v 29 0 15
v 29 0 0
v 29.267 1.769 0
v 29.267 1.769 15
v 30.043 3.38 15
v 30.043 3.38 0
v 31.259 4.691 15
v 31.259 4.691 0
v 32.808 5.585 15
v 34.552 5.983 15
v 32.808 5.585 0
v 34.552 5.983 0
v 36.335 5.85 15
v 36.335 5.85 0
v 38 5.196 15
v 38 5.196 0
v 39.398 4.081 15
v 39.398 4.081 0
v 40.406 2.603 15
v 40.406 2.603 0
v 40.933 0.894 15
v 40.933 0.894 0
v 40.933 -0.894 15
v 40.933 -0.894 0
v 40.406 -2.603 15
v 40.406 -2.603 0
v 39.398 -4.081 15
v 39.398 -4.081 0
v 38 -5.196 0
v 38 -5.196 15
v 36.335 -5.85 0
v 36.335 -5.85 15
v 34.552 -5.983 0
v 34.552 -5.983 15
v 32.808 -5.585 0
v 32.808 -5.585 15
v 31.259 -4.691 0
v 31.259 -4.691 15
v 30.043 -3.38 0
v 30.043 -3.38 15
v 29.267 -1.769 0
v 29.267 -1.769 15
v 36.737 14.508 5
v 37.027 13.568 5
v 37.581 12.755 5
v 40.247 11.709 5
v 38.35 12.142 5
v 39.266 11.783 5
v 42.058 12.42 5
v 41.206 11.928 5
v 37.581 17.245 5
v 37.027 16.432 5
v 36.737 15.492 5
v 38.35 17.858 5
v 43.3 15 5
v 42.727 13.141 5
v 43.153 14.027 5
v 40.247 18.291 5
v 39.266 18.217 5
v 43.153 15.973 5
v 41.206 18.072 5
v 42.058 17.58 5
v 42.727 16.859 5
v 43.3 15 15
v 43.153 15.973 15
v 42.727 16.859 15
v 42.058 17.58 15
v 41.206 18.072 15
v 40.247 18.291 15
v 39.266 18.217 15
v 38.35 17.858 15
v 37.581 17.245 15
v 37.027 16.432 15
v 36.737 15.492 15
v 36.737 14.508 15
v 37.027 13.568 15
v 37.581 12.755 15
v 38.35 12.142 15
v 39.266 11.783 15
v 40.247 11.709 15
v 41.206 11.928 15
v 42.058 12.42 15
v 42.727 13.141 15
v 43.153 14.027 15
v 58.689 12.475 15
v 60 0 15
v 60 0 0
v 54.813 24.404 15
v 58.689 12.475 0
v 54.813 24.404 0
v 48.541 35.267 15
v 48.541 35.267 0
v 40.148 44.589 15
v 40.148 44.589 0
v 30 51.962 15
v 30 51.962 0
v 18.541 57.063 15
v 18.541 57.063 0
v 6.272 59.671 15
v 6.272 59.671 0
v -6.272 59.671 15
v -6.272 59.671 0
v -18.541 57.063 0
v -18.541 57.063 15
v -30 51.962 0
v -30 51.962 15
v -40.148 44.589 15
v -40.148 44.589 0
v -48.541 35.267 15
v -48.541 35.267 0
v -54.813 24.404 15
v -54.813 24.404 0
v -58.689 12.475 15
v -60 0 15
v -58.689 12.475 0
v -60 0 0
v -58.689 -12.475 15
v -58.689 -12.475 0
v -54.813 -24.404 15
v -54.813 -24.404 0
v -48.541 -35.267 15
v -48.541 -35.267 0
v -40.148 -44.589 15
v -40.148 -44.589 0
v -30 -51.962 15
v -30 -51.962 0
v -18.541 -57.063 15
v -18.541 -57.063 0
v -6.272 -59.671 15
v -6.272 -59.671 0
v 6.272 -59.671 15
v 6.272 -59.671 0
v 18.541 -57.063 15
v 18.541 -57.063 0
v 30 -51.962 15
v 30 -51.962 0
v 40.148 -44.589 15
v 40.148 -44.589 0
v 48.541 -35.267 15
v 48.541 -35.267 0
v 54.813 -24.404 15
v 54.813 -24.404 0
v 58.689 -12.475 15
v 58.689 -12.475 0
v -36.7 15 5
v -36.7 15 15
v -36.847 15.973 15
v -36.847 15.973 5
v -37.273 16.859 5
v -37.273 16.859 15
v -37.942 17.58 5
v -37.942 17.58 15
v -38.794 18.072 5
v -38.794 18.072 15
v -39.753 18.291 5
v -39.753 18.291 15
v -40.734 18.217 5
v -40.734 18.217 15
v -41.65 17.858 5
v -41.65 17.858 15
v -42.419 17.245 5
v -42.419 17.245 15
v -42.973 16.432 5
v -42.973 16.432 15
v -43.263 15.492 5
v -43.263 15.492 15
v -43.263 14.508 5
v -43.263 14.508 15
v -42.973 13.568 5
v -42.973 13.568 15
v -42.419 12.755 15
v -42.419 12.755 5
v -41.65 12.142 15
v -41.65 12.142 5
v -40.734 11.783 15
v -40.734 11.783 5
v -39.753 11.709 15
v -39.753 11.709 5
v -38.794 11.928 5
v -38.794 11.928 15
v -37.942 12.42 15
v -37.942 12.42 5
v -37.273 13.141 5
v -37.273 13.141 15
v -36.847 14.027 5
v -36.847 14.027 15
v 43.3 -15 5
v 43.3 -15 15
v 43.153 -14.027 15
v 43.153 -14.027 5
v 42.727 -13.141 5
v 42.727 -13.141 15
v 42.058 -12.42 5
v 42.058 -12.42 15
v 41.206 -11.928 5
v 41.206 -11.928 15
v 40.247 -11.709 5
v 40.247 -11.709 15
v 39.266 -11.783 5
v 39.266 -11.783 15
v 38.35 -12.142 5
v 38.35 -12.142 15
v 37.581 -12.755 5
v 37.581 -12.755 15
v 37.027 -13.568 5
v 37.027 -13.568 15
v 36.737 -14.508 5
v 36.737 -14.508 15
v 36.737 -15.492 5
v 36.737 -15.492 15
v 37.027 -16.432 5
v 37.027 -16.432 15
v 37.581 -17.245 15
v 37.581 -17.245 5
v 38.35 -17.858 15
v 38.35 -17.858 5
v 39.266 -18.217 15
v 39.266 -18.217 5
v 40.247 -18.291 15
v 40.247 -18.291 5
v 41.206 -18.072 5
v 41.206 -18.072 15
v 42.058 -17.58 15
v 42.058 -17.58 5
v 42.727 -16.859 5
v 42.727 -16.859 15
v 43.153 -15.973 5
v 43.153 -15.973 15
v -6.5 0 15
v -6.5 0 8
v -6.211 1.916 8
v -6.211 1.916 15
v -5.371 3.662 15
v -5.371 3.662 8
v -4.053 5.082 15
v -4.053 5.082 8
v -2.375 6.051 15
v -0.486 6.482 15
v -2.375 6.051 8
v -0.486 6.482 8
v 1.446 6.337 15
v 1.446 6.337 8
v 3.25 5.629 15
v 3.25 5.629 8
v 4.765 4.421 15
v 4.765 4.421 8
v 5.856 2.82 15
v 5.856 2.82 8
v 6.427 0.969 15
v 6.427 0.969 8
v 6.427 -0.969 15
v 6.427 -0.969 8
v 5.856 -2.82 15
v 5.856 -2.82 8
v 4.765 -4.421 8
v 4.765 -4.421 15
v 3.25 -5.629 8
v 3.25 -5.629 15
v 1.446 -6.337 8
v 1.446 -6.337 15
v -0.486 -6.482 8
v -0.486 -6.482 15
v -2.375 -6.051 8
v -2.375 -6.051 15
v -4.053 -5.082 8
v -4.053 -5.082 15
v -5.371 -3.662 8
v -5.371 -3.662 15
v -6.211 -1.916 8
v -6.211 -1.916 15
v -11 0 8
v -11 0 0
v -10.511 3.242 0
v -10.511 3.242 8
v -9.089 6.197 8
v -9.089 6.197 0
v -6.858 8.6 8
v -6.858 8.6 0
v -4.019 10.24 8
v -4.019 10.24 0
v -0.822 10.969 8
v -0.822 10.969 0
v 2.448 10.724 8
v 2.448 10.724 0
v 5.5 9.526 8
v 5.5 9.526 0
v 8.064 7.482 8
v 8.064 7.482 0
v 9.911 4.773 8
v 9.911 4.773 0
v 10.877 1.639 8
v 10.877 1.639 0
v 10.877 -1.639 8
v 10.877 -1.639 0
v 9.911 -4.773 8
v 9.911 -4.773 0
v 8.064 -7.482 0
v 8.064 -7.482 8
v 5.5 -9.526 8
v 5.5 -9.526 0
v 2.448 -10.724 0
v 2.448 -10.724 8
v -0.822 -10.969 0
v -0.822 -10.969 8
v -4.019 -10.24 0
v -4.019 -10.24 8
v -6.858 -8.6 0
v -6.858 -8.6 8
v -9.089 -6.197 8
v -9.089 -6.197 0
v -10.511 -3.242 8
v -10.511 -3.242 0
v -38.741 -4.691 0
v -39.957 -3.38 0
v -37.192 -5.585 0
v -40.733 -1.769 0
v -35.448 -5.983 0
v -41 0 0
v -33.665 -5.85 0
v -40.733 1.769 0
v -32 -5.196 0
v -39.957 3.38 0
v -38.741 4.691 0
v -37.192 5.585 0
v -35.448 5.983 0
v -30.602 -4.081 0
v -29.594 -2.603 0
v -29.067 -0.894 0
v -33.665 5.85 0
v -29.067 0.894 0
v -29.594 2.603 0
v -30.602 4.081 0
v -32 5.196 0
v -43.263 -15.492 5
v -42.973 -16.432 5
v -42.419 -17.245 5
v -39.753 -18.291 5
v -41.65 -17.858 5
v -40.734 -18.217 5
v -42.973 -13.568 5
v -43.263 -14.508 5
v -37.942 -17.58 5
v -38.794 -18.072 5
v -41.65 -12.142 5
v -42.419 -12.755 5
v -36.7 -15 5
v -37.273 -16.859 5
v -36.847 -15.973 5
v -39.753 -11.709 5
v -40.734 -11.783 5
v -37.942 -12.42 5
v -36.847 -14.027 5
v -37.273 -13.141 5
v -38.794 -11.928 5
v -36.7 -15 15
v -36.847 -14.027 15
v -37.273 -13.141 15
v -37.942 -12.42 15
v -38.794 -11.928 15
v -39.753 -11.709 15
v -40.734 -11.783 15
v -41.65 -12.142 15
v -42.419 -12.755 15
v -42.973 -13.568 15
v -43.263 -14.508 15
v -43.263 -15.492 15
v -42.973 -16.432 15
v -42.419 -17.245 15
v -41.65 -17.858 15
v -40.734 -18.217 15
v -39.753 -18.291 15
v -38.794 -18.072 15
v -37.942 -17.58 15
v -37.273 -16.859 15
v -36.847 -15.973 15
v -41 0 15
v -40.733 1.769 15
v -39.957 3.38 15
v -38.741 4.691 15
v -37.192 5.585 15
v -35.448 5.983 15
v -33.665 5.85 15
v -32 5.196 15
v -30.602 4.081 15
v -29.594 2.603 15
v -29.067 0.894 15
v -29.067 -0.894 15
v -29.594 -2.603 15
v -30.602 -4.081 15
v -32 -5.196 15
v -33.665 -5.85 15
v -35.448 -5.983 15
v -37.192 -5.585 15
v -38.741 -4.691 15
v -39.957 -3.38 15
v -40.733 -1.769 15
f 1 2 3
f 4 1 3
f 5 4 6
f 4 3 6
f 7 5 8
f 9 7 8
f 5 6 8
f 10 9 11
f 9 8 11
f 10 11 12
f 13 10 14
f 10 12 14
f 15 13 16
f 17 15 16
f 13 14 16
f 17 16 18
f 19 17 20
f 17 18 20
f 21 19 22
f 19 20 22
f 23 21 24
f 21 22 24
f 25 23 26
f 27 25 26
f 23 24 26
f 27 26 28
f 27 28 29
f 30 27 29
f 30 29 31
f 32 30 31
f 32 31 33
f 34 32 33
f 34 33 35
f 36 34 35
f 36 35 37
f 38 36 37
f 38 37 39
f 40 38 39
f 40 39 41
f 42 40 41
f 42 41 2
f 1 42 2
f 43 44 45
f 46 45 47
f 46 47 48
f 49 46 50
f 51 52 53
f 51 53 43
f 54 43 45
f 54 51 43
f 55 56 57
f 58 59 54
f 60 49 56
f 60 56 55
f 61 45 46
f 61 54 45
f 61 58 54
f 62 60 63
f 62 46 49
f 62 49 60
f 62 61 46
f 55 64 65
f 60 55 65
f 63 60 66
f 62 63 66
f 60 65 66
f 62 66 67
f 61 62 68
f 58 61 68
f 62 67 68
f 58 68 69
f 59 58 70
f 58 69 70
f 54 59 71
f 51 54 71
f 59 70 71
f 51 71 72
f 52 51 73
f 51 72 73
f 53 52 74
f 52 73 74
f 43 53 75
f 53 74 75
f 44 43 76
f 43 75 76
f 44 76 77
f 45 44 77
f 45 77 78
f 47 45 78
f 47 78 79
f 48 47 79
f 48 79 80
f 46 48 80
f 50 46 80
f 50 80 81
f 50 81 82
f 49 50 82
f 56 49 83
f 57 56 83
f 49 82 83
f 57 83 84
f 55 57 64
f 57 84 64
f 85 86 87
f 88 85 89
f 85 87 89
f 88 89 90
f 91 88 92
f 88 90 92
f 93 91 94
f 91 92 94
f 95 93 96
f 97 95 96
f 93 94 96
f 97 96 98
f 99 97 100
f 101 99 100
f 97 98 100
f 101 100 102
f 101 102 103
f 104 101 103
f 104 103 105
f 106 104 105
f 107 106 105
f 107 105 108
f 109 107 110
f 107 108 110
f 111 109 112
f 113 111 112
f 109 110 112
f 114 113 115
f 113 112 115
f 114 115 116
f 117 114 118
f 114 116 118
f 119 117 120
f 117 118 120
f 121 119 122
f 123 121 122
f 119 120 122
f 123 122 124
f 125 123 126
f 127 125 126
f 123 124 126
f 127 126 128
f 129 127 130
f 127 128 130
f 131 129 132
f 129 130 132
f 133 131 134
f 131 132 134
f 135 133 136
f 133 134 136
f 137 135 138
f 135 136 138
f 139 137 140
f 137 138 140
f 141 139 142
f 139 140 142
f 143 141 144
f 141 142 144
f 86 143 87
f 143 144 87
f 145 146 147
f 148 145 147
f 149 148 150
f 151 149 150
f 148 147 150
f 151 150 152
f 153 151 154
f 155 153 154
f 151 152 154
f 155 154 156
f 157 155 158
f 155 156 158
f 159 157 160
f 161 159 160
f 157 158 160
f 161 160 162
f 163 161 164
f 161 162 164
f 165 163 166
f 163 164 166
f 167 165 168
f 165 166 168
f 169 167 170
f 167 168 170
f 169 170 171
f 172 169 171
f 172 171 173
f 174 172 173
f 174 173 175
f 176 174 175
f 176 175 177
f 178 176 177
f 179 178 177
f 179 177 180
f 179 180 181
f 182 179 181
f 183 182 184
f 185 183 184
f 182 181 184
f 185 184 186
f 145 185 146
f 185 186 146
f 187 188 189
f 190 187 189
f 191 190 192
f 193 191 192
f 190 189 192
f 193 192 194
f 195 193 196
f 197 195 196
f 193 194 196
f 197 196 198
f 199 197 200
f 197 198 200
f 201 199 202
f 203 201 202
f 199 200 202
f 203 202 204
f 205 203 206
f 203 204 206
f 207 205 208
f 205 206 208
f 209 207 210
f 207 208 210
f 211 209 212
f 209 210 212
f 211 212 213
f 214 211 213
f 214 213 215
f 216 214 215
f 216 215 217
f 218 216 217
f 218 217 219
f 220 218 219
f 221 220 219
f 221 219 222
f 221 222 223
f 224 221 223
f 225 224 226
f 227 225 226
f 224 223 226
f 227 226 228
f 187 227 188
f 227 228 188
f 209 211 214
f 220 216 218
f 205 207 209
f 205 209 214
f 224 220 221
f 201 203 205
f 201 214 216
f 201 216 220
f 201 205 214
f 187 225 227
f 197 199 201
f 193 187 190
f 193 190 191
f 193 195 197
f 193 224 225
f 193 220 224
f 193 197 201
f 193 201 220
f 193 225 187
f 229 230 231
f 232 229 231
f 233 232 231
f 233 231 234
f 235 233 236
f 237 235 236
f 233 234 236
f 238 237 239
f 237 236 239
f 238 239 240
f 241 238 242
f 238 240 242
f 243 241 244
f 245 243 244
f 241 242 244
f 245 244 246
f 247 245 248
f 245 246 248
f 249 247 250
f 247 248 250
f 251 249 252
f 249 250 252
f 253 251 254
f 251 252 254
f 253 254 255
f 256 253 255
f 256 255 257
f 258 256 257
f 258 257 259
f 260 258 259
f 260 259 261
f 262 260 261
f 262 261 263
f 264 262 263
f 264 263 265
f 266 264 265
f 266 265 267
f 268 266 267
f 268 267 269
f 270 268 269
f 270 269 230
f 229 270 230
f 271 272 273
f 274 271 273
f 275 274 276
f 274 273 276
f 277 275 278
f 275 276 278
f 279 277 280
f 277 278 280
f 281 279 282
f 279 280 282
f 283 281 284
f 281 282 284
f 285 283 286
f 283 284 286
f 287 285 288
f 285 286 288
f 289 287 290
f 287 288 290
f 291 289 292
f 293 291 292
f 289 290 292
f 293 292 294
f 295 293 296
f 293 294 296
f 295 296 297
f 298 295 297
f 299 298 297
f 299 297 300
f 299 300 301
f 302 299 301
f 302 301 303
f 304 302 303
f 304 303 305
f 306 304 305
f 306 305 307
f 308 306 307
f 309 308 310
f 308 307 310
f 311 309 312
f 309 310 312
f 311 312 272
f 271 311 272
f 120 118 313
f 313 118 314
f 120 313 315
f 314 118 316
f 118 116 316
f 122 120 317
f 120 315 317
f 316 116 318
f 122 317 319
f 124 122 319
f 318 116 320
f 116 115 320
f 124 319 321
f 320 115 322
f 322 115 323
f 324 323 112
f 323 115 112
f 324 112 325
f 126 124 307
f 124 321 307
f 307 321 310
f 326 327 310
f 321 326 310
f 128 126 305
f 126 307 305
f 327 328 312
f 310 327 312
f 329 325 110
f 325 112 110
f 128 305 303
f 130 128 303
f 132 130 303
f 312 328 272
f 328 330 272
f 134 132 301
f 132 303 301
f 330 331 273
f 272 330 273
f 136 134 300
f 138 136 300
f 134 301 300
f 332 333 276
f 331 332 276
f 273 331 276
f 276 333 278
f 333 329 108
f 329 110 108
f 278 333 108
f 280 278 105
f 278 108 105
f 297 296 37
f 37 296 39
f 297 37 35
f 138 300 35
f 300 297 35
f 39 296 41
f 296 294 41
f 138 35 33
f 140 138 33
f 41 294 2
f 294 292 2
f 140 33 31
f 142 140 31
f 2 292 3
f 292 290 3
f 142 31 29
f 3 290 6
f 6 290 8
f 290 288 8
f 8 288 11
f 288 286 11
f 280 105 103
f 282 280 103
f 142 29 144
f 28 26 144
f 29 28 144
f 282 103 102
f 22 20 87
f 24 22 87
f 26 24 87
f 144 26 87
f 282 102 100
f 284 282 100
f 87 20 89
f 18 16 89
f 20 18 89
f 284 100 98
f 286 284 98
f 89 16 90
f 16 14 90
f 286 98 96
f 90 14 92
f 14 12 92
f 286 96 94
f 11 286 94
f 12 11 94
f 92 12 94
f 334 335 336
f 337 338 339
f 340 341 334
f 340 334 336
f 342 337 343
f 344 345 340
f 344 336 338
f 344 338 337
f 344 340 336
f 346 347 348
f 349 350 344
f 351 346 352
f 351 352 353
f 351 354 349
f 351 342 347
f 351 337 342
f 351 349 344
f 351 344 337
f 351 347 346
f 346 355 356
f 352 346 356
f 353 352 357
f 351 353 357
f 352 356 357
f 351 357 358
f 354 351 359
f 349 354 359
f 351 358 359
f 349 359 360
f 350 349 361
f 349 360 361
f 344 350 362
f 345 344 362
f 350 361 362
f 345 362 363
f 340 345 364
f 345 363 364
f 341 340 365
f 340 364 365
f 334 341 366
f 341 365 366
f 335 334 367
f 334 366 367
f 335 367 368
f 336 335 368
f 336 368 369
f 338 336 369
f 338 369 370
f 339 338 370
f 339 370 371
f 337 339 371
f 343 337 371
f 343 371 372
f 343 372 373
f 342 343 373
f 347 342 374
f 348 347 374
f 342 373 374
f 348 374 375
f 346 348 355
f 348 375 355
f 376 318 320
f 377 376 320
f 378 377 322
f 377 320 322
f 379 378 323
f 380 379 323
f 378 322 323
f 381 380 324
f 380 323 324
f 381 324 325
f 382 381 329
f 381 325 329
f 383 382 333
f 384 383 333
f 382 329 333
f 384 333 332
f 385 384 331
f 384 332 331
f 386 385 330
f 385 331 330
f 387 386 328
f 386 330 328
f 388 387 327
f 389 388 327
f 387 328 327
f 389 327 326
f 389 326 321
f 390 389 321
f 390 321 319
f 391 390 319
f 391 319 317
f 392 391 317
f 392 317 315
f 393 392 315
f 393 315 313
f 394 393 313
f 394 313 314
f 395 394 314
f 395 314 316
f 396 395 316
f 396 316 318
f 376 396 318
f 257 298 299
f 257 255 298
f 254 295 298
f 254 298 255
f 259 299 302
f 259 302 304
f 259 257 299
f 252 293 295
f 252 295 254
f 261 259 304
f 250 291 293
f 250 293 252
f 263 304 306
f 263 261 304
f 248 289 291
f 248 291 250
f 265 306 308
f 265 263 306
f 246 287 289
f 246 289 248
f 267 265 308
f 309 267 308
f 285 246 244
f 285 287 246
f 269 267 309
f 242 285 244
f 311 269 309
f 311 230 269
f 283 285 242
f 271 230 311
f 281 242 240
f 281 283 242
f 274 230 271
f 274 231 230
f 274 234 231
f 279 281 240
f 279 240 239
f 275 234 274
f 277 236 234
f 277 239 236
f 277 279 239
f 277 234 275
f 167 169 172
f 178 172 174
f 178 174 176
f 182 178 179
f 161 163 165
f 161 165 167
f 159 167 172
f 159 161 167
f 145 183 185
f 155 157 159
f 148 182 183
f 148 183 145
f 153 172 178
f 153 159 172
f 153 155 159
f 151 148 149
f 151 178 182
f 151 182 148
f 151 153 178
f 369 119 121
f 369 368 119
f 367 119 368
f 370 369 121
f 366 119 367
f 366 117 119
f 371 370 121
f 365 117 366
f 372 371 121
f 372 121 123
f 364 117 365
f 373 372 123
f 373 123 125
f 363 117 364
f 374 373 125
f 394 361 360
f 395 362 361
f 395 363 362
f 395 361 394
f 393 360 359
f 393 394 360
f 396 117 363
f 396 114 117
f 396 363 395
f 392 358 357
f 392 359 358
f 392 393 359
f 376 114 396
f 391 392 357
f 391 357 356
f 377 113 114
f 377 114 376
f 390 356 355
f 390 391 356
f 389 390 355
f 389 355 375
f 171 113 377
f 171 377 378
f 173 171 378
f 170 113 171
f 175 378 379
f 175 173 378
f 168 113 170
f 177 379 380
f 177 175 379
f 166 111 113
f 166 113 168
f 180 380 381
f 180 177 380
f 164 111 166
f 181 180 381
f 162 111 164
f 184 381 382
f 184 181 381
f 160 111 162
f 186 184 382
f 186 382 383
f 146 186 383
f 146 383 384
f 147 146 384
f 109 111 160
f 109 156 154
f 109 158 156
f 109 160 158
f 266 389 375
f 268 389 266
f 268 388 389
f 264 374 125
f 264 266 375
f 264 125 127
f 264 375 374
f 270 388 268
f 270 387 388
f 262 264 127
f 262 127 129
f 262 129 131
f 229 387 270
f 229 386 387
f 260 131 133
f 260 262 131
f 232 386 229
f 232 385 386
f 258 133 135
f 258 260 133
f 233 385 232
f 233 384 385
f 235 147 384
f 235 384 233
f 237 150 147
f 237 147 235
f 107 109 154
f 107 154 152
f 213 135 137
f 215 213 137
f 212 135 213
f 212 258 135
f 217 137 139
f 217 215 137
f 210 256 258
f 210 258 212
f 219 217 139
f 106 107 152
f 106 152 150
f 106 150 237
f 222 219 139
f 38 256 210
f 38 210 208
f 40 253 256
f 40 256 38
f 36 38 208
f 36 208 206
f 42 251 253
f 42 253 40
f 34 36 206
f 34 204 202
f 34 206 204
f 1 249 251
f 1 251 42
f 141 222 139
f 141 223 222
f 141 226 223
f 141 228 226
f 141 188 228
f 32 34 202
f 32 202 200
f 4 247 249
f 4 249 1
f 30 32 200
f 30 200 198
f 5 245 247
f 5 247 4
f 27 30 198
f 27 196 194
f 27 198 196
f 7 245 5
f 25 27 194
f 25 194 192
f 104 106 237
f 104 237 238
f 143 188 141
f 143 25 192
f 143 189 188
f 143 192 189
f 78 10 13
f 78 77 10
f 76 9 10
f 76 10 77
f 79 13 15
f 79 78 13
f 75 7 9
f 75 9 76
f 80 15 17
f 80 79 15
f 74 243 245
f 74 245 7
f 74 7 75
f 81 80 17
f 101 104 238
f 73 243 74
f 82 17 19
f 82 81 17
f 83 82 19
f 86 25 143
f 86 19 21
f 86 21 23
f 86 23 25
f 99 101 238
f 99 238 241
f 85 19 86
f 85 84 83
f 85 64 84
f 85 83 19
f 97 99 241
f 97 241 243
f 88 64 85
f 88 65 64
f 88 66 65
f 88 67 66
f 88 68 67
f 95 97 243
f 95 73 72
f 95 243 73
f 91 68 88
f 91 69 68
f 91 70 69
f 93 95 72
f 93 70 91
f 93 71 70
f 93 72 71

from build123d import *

# Parameters (mm, degrees)
SKETCH_1_R          = 60
EXTRUDE_1_DEPTH     = 15
SKETCH_2_R          = 6
CUT_EXTRUDE_1_DEPTH = 87.168439698
SKETCH_3_R          = 11
CUT_EXTRUDE_2_DEPTH = 8
SKETCH_4_R          = 6.5
CUT_EXTRUDE_3_DEPTH = 10
SKETCH_5_R          = 3.3
CUT_EXTRUDE_4_DEPTH = 10


with BuildPart() as part:
    # 草图1 → 凸台-拉伸1 (new body)
    with BuildSketch(Plane.XY):
        Circle(SKETCH_1_R)
    extrude(amount=EXTRUDE_1_DEPTH)

    # 草图2 → 切除-拉伸1 (cut, through all)
    with BuildSketch(Plane(origin=(0, 0, 0), x_dir=(-1, 0, 0), z_dir=(0, 0, -1))):
        with Locations((-35, 0)):
            Circle(SKETCH_2_R)
        with Locations((35, 0)):
            Circle(SKETCH_2_R)
    extrude(amount=-CUT_EXTRUDE_1_DEPTH, mode=Mode.SUBTRACT)

    # 草图3 → 切除-拉伸2 (cut)
    with BuildSketch(Plane(origin=(0, 0, 0), x_dir=(-1, 0, 0), z_dir=(0, 0, -1))):
        Circle(SKETCH_3_R)
    extrude(amount=-CUT_EXTRUDE_2_DEPTH, mode=Mode.SUBTRACT)

    # 草图4 → 切除-拉伸3 (cut)
    with BuildSketch(Plane(origin=(0, 0, 8), x_dir=(-1, 0, 0), z_dir=(0, 0, -1))):
        Circle(SKETCH_4_R)
    extrude(amount=-CUT_EXTRUDE_3_DEPTH, mode=Mode.SUBTRACT)

    # 草图5 → 切除-拉伸4 (cut)
    with BuildSketch(Plane.XY.offset(15)):
        with Locations((40, 15)):
            Circle(SKETCH_5_R)
        with Locations((40, -15)):
            Circle(SKETCH_5_R)
        with Locations((-40, -15)):
            Circle(SKETCH_5_R)
        with Locations((-40, 15)):
            Circle(SKETCH_5_R)
    extrude(amount=-CUT_EXTRUDE_4_DEPTH, mode=Mode.SUBTRACT)


solid = part.part
